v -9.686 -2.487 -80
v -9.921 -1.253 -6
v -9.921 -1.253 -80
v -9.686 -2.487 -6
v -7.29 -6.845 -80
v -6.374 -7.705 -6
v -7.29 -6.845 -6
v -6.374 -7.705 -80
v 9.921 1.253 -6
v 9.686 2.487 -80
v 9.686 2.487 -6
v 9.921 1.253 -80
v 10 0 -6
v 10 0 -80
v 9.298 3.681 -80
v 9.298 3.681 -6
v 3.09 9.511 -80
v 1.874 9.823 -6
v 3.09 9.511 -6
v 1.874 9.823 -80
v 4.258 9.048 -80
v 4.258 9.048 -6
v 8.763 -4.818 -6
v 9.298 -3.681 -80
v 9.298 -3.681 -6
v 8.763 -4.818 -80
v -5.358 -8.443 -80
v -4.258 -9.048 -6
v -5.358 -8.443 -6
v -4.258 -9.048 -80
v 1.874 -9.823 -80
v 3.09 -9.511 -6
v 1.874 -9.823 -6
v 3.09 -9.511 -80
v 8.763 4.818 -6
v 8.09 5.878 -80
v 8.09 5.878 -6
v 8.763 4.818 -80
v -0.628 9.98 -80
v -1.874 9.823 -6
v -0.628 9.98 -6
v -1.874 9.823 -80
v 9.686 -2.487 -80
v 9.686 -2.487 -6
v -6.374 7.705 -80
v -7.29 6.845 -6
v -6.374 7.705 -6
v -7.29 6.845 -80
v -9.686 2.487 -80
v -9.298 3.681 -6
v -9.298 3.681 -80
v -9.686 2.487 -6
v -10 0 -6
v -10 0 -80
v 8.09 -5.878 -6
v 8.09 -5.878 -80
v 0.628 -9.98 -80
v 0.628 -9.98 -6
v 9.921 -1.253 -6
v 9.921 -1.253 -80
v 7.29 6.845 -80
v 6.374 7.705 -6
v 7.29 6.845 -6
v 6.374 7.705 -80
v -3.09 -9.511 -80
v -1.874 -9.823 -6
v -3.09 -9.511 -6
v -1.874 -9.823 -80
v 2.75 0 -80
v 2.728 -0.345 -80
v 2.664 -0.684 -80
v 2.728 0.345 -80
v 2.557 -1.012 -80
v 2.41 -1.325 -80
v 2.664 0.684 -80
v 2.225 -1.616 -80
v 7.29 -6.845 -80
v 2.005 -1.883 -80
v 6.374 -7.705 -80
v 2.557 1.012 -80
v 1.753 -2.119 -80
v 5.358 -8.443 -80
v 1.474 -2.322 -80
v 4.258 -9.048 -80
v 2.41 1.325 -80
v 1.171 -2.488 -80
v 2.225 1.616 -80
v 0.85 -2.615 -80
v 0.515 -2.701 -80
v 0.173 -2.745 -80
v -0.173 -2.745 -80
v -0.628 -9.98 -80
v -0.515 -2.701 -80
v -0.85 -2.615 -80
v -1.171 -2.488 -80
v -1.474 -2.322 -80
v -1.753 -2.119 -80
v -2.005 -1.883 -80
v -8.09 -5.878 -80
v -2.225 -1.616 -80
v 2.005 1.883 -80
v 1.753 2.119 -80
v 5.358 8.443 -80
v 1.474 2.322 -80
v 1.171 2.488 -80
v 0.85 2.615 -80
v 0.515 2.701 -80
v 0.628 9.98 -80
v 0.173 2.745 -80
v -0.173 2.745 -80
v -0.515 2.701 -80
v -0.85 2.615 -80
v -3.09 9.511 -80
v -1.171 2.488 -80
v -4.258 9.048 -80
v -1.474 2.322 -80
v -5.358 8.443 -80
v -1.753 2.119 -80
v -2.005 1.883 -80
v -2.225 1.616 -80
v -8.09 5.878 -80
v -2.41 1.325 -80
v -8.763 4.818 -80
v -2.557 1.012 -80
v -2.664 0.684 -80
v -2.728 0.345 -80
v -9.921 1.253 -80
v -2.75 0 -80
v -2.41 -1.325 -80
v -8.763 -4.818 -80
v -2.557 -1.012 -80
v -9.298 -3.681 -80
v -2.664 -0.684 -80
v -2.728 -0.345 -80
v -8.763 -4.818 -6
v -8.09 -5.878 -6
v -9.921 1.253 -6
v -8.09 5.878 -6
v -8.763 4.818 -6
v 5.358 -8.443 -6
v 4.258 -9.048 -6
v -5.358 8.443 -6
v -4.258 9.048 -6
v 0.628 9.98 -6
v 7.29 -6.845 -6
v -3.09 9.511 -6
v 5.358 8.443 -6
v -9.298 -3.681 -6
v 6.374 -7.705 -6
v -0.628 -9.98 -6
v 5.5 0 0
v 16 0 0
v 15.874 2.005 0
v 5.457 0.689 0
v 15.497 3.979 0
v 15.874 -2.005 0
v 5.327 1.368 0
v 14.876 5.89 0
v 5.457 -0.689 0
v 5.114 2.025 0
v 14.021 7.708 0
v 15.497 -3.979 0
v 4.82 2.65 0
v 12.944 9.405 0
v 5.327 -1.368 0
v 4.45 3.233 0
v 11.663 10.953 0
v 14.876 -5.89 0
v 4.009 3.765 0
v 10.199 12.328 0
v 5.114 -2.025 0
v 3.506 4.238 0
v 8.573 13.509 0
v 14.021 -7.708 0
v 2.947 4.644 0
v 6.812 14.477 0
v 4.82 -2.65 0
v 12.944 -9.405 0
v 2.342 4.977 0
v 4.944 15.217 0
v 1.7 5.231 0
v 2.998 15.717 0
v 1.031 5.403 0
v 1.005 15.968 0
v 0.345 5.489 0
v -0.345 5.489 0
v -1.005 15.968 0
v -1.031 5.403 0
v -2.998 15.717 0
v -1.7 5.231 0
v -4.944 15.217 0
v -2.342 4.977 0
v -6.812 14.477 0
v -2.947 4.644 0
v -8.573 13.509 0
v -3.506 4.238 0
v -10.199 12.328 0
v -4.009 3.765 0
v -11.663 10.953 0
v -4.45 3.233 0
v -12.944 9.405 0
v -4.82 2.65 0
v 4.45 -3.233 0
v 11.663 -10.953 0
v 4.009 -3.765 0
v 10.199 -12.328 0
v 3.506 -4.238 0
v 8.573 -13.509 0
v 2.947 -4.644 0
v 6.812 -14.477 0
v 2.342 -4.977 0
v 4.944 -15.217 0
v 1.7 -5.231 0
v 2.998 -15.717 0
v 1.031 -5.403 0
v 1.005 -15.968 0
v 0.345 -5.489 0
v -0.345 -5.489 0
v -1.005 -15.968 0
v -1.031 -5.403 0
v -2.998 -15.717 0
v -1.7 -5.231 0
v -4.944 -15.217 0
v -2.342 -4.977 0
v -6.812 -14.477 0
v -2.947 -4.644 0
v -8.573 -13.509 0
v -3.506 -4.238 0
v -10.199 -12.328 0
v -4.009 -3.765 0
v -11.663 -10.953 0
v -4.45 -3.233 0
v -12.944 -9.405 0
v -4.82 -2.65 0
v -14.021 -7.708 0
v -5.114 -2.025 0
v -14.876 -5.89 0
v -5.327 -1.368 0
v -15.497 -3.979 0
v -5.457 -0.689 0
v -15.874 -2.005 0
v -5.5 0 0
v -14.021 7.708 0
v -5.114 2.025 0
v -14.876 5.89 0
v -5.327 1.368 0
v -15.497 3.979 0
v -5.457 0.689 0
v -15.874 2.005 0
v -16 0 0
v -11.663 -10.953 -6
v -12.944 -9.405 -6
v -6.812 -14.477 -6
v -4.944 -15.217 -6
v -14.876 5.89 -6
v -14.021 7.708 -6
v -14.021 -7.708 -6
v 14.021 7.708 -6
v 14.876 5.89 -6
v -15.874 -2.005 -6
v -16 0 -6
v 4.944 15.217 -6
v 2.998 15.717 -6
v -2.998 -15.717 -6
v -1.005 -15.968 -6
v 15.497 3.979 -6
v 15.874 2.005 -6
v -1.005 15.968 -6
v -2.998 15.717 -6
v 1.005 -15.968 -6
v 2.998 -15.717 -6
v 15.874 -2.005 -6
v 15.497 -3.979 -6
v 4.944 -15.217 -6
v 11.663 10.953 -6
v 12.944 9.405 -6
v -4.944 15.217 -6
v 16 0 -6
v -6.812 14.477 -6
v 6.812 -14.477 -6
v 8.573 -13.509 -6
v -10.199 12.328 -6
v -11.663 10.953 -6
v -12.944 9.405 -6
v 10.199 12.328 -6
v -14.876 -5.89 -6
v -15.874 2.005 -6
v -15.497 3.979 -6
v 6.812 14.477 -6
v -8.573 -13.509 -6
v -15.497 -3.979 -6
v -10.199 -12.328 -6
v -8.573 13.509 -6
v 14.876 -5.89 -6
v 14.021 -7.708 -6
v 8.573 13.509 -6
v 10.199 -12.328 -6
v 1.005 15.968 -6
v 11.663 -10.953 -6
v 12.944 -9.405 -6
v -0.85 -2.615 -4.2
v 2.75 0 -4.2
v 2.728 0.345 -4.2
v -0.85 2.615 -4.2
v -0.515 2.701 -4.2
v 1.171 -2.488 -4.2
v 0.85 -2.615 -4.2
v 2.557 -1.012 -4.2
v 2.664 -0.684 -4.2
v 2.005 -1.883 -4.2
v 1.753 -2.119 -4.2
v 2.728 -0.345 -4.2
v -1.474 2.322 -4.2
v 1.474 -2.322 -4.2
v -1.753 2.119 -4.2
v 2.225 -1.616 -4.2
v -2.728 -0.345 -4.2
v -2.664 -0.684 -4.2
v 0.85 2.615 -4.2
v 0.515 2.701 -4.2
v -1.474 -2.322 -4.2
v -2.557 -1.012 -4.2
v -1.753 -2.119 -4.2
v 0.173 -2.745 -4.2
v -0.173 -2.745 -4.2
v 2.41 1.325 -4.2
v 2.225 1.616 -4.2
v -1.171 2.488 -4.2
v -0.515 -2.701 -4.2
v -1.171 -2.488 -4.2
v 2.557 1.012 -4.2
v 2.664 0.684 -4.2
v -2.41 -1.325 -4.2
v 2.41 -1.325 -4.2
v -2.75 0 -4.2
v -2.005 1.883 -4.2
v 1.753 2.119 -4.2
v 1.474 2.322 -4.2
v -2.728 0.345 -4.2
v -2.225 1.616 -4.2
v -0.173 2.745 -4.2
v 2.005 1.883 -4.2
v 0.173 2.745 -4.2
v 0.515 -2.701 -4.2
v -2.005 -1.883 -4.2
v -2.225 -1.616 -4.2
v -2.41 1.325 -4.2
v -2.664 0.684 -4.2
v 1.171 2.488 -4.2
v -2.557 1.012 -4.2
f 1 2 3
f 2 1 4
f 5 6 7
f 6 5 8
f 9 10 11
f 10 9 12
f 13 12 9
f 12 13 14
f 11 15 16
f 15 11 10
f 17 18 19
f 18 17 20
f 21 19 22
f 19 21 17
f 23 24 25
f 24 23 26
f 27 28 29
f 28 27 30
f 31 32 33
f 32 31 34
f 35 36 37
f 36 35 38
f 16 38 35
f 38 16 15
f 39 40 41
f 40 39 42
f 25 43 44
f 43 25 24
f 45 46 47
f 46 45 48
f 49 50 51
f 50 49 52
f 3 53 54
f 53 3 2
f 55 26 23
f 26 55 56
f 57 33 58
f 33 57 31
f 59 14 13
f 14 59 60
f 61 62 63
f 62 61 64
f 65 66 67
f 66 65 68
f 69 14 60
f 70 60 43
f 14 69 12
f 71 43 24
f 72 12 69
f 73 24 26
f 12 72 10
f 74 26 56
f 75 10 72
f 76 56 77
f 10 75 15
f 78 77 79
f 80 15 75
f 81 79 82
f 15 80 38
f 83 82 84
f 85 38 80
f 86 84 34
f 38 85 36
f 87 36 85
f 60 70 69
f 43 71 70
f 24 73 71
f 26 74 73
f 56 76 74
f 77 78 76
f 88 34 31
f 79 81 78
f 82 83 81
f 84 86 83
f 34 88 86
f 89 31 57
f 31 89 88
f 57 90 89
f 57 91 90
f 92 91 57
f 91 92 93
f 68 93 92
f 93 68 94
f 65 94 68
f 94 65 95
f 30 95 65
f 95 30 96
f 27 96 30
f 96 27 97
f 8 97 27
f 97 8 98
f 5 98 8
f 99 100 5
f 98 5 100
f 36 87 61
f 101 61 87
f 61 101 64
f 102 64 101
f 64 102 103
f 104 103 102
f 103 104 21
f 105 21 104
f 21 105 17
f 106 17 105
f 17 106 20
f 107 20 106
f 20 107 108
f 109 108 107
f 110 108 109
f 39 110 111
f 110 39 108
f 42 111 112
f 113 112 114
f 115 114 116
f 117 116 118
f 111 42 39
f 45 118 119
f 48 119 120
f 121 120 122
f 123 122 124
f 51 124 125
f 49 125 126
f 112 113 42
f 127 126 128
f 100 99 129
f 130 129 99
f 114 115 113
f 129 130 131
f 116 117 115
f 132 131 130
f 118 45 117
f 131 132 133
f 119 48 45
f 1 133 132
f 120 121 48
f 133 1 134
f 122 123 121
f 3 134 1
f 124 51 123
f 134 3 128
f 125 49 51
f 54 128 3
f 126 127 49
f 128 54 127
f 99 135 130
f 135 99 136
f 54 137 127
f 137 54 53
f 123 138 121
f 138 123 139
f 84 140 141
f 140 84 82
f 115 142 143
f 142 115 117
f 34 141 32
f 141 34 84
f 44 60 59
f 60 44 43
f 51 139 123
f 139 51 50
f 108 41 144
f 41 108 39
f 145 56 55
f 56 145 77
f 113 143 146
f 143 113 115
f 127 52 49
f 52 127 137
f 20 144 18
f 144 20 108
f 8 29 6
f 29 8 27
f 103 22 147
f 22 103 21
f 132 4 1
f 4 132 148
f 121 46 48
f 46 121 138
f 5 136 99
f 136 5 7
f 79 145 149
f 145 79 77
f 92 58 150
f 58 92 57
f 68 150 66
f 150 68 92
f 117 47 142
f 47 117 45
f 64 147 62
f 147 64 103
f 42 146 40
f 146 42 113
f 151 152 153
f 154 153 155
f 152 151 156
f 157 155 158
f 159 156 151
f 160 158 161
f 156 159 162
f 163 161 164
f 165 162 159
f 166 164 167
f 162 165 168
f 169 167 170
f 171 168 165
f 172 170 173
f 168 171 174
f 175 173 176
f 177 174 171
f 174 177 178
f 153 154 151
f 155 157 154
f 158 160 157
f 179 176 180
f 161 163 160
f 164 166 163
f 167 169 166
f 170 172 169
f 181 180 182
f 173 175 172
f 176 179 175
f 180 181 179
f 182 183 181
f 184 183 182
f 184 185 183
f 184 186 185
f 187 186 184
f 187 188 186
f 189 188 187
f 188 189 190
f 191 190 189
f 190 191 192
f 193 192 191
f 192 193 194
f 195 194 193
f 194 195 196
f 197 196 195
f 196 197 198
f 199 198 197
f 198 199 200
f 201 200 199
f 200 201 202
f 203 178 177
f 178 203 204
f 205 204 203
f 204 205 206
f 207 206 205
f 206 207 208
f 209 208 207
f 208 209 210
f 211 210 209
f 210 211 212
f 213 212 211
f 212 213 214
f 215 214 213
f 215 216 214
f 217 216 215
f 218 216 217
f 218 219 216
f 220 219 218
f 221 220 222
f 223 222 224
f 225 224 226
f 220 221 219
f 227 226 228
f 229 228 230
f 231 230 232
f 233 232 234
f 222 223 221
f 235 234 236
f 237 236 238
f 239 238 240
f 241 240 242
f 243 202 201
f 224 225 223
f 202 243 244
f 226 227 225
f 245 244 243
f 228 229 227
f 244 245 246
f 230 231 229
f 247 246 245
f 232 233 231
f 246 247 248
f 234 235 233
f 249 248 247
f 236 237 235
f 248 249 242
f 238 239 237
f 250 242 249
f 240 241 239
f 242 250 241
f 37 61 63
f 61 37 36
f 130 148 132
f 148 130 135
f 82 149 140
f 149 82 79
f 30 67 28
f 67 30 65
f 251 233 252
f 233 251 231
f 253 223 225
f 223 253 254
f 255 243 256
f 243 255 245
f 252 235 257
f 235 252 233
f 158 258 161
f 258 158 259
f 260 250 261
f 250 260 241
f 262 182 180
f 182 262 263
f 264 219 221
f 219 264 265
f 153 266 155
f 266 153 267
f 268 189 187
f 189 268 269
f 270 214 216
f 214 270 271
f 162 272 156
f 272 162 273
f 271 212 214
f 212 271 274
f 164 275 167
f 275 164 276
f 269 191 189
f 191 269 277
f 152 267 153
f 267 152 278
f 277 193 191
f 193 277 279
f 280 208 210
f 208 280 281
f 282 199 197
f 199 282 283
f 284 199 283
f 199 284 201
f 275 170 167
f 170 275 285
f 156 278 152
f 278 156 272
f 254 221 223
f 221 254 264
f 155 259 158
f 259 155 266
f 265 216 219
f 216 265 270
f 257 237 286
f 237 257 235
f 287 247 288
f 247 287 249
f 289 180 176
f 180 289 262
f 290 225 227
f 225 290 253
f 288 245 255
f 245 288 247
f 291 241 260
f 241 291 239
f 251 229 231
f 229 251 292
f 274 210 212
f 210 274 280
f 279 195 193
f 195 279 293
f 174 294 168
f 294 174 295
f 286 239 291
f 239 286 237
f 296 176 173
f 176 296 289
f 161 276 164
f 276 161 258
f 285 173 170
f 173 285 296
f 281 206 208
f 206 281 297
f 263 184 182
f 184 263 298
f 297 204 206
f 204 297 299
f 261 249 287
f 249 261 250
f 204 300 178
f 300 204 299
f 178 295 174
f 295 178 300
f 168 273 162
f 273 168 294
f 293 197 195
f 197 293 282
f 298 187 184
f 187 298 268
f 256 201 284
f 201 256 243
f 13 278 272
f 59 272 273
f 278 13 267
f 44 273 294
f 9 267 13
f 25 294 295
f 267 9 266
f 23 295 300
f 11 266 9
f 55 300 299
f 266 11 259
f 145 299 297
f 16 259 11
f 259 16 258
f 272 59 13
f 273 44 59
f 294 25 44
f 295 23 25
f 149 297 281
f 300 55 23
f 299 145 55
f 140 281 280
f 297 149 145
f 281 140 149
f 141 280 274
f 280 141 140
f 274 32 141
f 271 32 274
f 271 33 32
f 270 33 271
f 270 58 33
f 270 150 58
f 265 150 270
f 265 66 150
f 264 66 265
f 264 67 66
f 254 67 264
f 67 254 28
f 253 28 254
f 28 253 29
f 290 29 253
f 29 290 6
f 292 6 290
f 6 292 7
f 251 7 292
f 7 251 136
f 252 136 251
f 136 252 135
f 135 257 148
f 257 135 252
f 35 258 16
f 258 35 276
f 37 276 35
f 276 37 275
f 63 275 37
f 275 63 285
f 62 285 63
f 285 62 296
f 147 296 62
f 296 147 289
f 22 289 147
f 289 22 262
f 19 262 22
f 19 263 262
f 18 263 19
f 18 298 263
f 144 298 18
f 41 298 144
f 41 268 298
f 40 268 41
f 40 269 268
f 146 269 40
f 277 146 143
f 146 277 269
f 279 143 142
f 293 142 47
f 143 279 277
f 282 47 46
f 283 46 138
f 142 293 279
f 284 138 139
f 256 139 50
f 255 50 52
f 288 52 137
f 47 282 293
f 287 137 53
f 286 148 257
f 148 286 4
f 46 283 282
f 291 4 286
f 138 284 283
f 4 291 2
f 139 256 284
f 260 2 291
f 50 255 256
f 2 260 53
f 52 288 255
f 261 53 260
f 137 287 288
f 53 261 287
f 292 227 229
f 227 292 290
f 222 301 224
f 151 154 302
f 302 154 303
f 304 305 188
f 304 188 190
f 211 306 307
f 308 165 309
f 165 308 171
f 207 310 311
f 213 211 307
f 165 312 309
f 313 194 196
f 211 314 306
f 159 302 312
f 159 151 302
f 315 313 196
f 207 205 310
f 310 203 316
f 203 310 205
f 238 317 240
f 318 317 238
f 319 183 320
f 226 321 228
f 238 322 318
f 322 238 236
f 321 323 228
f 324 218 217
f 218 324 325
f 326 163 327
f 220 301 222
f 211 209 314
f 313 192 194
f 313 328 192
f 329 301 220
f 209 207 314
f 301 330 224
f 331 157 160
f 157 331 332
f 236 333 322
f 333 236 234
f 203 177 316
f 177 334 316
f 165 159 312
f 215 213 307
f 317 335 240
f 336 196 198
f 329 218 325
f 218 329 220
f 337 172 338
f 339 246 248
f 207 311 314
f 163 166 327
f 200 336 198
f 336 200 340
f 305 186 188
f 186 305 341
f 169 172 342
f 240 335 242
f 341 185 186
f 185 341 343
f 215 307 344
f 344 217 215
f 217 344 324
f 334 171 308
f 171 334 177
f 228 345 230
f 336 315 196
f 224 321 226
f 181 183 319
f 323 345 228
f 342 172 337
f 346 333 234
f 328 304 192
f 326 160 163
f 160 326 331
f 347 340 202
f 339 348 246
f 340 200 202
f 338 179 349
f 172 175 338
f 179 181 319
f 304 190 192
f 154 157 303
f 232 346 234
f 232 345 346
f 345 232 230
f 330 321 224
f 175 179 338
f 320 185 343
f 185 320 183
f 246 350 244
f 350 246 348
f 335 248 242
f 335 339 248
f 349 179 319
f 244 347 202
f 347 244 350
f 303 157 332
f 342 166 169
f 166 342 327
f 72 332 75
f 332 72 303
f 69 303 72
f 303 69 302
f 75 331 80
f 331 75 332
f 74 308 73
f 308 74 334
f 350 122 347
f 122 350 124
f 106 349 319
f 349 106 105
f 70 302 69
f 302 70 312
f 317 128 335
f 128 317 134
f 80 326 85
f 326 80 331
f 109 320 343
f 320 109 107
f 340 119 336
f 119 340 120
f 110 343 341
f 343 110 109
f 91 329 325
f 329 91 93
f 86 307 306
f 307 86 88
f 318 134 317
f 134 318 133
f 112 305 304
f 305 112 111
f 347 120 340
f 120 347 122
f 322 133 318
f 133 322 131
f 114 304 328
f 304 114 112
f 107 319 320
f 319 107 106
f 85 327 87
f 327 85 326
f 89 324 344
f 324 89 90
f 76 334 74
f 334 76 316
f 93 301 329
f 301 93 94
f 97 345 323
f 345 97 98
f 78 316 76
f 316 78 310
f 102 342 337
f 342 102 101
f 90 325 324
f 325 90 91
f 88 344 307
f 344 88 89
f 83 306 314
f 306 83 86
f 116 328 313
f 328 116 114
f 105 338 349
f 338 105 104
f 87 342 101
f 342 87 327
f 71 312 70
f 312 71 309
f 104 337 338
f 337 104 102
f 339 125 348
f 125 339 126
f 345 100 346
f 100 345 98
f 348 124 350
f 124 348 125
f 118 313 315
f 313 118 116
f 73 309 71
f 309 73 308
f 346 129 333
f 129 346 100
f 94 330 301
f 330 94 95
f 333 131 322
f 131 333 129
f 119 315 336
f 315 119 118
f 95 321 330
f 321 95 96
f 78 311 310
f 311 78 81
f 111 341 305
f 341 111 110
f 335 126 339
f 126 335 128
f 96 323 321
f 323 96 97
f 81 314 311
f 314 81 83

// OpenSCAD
$fn = 50;


difference() {
	union() {
		translate(v = [0, 0, -80.0000000000]) {
			cylinder(h = 80, r = 10.0000000000);
		}
		translate(v = [0, 0, -6.0000000000]) {
			cylinder(h = 6, r = 16.0000000000);
		}
	}
	union() {
		translate(v = [0, 0, 0]) {
			rotate(a = [0, 0, 0]) {
				difference() {
					union() {
						#translate(v = [0, 0, -80.0000000000]) {
							cylinder(h = 80, r = 2.2500000000);
						}
						#translate(v = [0, 0, -4.2000000000]) {
							cylinder(h = 4.2000000000, r1 = 2.7500000000, r2 = 5.5000000000);
						}
						#translate(v = [0, 0, -80.0000000000]) {
							cylinder(h = 80, r = 2.7500000000);
						}
						#translate(v = [0, 0, -80.0000000000]) {
							cylinder(h = 80, r = 2.2500000000);
						}
					}
					union();
				}
			}
		}
	}
}
